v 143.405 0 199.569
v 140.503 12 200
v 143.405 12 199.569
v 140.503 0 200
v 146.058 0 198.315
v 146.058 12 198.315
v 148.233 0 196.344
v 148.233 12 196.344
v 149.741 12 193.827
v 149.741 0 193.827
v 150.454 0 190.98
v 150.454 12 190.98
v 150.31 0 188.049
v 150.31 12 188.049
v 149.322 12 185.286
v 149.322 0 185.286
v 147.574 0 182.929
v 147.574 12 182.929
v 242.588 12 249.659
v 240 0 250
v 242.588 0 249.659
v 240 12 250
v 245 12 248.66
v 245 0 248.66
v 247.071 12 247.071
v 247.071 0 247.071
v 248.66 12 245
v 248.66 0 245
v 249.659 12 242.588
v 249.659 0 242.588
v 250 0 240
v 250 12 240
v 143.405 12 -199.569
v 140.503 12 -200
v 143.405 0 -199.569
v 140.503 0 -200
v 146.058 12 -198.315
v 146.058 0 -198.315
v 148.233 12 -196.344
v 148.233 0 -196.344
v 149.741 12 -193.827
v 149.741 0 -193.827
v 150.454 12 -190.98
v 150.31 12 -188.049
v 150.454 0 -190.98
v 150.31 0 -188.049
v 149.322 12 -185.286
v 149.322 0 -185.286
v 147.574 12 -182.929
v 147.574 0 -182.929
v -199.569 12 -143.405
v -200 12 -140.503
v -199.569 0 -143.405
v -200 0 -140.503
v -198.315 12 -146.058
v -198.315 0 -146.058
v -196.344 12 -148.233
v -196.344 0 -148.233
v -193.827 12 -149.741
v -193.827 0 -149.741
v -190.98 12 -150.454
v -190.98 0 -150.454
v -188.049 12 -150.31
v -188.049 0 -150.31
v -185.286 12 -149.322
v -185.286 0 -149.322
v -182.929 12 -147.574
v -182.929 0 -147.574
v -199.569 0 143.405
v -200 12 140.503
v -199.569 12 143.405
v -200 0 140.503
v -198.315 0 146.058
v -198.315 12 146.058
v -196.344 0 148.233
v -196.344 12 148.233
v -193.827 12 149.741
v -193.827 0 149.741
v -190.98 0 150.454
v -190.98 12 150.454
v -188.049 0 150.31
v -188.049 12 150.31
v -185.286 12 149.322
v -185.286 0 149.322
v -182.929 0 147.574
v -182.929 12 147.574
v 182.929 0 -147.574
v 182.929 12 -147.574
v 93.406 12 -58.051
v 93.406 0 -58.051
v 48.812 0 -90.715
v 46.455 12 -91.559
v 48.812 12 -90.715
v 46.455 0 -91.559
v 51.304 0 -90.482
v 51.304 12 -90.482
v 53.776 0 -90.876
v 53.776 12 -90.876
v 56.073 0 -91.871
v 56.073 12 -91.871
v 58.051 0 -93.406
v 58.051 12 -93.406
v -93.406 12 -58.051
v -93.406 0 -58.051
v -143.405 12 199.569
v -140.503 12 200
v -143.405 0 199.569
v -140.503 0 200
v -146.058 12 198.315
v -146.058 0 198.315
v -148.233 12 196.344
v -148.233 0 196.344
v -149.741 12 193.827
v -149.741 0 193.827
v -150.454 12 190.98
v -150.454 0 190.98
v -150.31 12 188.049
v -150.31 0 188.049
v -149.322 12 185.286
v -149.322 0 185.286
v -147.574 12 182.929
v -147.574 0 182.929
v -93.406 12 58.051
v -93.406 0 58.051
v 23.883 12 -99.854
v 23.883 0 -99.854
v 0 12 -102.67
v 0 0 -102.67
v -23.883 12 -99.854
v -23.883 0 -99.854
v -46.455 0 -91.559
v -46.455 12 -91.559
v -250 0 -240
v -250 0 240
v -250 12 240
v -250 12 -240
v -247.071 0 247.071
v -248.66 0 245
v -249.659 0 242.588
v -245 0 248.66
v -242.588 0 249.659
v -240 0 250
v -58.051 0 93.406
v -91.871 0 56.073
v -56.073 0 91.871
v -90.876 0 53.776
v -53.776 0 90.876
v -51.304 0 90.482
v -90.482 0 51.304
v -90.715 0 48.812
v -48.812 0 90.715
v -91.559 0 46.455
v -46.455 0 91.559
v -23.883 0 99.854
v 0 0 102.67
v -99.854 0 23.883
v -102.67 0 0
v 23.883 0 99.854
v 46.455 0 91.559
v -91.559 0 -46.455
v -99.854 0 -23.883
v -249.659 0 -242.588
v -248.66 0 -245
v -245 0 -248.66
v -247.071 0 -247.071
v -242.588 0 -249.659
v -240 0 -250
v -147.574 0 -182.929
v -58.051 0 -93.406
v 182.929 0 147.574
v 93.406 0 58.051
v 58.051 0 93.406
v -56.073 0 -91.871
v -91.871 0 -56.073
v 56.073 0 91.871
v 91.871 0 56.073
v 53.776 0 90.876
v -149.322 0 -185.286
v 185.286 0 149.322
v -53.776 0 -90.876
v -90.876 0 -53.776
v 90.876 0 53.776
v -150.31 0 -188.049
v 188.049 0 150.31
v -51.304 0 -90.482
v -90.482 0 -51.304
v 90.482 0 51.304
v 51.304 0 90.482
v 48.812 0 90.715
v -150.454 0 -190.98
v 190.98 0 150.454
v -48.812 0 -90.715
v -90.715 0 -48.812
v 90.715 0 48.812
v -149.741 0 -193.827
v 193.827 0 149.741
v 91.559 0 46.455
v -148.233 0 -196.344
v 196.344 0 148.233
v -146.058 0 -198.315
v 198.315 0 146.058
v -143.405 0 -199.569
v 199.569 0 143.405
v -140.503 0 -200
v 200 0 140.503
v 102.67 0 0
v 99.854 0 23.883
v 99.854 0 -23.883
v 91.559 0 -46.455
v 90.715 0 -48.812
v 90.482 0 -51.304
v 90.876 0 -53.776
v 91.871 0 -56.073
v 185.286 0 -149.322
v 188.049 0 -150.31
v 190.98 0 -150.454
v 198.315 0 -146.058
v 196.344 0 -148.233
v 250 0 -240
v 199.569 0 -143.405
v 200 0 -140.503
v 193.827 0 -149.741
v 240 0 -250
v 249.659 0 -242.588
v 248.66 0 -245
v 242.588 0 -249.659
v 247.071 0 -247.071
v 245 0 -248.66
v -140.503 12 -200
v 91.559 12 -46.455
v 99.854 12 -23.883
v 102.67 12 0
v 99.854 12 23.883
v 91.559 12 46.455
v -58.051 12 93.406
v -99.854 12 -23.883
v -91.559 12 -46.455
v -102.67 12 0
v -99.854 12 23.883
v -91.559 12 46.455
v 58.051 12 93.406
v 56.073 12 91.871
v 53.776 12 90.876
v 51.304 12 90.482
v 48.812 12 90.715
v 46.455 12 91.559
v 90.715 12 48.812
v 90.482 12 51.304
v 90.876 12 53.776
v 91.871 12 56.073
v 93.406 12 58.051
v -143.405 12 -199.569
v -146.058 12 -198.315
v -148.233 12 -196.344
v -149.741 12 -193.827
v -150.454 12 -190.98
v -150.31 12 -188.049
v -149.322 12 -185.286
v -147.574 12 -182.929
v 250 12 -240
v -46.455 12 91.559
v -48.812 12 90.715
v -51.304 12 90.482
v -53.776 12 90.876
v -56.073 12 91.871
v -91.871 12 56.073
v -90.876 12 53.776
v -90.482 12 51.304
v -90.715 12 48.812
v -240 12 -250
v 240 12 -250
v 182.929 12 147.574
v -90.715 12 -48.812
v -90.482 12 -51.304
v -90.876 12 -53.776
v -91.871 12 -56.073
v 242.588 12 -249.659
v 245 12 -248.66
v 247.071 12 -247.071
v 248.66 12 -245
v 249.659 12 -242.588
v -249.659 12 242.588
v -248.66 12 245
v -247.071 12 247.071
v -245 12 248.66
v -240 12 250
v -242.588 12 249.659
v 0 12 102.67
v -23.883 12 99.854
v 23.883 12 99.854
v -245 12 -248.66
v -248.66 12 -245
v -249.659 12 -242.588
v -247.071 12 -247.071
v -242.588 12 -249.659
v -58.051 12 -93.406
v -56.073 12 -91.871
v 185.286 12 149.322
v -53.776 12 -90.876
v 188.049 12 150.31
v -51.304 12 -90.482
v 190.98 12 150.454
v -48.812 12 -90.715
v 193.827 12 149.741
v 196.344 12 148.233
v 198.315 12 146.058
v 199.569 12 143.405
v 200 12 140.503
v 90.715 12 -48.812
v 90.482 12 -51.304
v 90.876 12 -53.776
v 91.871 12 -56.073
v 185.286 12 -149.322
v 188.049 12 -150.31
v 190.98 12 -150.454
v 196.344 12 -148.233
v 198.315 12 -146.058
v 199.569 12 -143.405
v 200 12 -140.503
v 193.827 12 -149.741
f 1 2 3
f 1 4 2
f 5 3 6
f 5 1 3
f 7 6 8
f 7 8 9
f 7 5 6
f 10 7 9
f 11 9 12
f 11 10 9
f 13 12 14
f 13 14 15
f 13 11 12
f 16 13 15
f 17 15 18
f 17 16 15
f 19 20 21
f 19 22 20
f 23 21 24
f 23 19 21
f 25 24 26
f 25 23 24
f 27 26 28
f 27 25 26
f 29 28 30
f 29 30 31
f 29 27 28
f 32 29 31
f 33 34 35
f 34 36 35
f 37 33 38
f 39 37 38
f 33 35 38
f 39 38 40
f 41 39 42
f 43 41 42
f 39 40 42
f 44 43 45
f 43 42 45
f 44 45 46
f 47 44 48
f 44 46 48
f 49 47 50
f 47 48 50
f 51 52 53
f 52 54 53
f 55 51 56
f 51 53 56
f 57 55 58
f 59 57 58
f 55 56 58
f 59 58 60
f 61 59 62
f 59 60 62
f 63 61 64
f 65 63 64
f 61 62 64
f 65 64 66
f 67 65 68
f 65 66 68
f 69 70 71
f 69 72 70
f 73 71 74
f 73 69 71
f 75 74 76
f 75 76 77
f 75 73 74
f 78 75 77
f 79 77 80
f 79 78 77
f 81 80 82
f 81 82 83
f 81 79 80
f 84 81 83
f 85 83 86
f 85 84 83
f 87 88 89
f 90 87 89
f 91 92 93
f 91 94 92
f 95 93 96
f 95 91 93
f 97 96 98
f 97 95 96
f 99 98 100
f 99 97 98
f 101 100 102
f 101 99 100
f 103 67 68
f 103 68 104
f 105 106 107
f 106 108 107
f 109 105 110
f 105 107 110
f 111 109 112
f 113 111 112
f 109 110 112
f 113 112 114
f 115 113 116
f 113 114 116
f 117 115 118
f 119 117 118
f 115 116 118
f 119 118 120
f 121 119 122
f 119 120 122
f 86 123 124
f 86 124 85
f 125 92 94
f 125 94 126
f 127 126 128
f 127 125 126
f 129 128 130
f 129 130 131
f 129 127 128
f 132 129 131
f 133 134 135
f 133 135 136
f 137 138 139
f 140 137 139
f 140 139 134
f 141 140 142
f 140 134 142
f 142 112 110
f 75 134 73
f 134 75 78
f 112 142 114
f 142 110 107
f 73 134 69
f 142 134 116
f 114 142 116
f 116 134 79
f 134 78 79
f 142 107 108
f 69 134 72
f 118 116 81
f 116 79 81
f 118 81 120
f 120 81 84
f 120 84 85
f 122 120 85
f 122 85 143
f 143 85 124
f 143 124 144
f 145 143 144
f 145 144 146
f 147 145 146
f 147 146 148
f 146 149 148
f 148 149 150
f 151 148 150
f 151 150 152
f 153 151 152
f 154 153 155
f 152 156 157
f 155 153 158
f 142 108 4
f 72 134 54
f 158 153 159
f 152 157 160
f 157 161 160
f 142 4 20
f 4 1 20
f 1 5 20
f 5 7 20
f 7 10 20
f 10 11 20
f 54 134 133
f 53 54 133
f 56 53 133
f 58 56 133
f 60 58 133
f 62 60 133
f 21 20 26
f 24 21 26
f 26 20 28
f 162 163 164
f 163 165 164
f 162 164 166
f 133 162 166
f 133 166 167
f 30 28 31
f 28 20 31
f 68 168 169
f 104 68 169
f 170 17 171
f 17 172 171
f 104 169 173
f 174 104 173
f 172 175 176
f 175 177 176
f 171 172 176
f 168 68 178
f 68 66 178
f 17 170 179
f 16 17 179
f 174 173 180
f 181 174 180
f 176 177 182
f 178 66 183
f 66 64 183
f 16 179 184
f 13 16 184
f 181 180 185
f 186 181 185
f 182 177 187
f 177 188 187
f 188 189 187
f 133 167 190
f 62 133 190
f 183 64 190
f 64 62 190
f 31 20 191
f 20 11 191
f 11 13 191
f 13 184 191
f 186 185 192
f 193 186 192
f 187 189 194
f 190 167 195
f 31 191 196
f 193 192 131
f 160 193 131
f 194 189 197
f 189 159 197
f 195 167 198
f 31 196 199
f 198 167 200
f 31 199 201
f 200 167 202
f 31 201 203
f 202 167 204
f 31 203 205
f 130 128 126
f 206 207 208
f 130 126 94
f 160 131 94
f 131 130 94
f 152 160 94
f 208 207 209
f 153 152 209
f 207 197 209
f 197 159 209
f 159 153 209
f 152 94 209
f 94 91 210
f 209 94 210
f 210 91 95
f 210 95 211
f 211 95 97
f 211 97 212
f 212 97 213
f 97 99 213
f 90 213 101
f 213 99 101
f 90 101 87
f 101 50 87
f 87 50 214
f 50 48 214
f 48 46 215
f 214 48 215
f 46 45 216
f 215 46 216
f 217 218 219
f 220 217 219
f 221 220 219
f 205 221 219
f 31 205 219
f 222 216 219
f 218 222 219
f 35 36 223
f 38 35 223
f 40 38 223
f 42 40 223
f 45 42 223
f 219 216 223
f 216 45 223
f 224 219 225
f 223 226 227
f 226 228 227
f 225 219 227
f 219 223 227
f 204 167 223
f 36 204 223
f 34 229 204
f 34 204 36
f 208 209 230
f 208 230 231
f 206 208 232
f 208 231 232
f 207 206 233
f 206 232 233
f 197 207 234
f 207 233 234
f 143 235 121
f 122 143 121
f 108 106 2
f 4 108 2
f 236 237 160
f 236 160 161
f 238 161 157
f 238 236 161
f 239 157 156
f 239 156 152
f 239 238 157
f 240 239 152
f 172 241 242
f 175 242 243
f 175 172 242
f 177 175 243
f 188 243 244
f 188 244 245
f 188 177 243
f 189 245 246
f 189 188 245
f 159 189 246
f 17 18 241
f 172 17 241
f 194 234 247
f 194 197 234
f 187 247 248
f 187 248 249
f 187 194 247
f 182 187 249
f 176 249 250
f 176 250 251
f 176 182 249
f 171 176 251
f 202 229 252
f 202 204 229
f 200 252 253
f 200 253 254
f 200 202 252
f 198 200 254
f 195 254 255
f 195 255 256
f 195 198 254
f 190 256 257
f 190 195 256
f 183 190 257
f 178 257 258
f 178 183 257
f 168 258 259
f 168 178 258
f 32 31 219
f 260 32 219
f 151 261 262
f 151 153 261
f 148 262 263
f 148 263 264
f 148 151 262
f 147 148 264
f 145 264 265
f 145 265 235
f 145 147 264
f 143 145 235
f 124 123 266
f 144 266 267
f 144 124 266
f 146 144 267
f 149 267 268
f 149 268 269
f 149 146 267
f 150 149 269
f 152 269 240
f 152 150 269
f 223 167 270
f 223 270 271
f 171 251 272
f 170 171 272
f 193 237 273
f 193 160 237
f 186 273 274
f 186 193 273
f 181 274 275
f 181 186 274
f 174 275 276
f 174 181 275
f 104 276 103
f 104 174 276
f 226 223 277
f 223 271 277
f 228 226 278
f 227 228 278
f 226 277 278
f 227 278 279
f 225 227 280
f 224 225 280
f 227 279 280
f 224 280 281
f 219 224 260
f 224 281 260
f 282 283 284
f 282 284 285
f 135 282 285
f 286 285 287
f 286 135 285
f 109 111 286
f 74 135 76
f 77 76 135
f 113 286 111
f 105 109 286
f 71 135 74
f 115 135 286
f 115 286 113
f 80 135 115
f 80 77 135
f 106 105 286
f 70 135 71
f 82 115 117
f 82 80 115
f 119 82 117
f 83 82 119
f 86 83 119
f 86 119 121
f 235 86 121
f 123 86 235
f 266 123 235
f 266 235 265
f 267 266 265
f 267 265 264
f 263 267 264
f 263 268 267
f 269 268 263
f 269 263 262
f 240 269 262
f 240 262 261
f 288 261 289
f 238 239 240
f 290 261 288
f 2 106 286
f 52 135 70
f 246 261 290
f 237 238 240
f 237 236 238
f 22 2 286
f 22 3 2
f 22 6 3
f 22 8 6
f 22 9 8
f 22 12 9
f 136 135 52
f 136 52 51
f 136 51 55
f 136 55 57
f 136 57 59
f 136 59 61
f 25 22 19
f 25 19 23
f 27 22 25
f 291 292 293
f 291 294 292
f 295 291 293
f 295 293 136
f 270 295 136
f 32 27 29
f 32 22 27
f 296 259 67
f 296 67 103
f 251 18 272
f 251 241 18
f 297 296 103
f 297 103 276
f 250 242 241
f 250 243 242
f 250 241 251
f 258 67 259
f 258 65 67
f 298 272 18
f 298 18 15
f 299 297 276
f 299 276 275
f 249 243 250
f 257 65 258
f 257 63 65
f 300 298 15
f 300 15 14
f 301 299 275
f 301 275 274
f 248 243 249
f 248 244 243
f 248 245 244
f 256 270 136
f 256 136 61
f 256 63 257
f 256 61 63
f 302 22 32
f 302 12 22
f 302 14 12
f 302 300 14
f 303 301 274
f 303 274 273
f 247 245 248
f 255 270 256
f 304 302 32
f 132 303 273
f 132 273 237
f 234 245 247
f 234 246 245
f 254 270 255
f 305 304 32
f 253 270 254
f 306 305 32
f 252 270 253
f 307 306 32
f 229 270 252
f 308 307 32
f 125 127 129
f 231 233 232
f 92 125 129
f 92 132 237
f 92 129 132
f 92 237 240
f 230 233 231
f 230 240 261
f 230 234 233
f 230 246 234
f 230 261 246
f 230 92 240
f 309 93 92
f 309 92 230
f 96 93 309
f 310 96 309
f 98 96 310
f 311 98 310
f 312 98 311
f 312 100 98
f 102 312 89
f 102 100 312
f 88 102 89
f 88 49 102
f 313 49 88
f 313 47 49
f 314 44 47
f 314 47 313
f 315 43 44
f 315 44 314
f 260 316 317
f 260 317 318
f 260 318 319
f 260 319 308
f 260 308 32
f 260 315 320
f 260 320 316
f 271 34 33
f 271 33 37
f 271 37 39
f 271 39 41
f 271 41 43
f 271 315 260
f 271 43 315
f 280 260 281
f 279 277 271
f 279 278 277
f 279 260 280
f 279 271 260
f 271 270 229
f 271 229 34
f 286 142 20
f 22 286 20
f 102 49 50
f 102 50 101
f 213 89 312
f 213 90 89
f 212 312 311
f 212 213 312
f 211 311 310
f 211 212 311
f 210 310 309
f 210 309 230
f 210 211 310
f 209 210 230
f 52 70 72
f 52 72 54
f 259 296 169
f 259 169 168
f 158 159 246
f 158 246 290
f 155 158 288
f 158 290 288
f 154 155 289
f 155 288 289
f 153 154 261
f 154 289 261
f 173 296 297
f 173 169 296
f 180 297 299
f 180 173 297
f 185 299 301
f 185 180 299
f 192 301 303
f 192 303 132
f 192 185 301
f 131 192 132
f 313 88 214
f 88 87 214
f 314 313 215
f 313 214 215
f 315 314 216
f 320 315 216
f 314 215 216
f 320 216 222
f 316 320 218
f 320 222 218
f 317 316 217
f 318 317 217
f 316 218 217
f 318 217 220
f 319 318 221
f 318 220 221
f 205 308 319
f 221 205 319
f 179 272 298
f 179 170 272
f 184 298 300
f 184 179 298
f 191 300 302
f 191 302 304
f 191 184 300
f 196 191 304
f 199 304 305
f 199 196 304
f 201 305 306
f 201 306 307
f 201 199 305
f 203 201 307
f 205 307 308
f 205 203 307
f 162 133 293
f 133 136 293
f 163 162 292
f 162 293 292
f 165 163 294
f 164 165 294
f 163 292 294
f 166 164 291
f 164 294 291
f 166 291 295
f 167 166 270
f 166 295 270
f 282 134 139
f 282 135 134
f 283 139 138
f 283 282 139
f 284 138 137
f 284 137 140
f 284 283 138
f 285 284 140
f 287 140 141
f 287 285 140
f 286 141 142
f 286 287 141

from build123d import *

# Parameters (mm, degrees)
SKETCH1_W           = 500
SKETCH1_H           = 500
BOSS_EXTRUDE1_DEPTH = 12
CUT_EXTRUDE1_DEPTH  = 12
FILLET1_R           = 10


with BuildPart() as part:
    # Sketch1 → Boss-Extrude1 (new body)
    with BuildSketch(Plane(origin=(0, 0, 0), x_dir=(1, 0, 0), z_dir=(0, 1, 0))):
        Rectangle(SKETCH1_W, SKETCH1_H)
    extrude(amount=BOSS_EXTRUDE1_DEPTH)

    # Sketch2 → Cut-Extrude1 (cut)
    with BuildSketch(Plane(origin=(0, 12, 0), x_dir=(1, 0, 0), z_dir=(0, 1, 0))):
        with BuildLine():
            Line((-200, 164.644660941), (-88.091394352, 52.736055293))
            ThreePointArc((-88.091394352, 52.736055293), (-102.670274602, 0), (-88.091394352, -52.736055293))
            Line((-88.091394352, -52.736055293), (-200, -164.644660941))
            Line((-200, -164.644660941), (-200, 164.644660941))
        make_face()
        with BuildLine():
            Line((164.644660941, 200), (52.736055293, 88.091394352))
            ThreePointArc((52.736055293, 88.091394352), (0, 102.670274602), (-52.736055293, 88.091394352))
            Line((-52.736055293, 88.091394352), (-164.644660941, 200))
            Line((-164.644660941, 200), (164.644660941, 200))
        make_face()
        with BuildLine():
            Line((200, 164.644660941), (88.091394352, 52.736055293))
            ThreePointArc((88.091394352, 52.736055293), (102.670274602, 0), (88.091394352, -52.736055293))
            Line((88.091394352, -52.736055293), (200, -164.644660941))
            Line((200, -164.644660941), (200, 164.644660941))
        make_face()
        with BuildLine():
            Line((-164.644660941, -200), (164.644660941, -200))
            Line((164.644660941, -200), (52.736055293, -88.091394352))
            ThreePointArc((52.736055293, -88.091394352), (0, -102.670274602), (-52.736055293, -88.091394352))
            Line((-52.736055293, -88.091394352), (-164.644660941, -200))
        make_face()
    extrude(amount=-CUT_EXTRUDE1_DEPTH, mode=Mode.SUBTRACT)

    # Fillet1
    fillet1_edges = [part.edges().sort_by_distance(p)[0] for p in [
        (-200, 6, 164.644660941),
        (-200, 6, -164.644660941),
        (-88.091394352, 6, -52.736055293),
        (-88.091394352, 6, 52.736055293),
        (-164.644660941, 6, -200),
        (164.644660941, 6, -200),
        (52.736055293, 6, -88.091394352),
        (-52.736055293, 6, -88.091394352),
        (52.736055293, 6, 88.091394352),
        (164.644660941, 6, 200),
        (-164.644660941, 6, 200),
        (-52.736055293, 6, 88.091394352),
        (88.091394352, 6, 52.736055293),
        (88.091394352, 6, -52.736055293),
        (200, 6, -164.644660941),
        (200, 6, 164.644660941),
        (-250, 6, -250),
        (250, 6, -250),
        (250, 6, 250),
        (-250, 6, 250),
    ]]
    fillet(fillet1_edges, radius=FILLET1_R)


solid = part.part
